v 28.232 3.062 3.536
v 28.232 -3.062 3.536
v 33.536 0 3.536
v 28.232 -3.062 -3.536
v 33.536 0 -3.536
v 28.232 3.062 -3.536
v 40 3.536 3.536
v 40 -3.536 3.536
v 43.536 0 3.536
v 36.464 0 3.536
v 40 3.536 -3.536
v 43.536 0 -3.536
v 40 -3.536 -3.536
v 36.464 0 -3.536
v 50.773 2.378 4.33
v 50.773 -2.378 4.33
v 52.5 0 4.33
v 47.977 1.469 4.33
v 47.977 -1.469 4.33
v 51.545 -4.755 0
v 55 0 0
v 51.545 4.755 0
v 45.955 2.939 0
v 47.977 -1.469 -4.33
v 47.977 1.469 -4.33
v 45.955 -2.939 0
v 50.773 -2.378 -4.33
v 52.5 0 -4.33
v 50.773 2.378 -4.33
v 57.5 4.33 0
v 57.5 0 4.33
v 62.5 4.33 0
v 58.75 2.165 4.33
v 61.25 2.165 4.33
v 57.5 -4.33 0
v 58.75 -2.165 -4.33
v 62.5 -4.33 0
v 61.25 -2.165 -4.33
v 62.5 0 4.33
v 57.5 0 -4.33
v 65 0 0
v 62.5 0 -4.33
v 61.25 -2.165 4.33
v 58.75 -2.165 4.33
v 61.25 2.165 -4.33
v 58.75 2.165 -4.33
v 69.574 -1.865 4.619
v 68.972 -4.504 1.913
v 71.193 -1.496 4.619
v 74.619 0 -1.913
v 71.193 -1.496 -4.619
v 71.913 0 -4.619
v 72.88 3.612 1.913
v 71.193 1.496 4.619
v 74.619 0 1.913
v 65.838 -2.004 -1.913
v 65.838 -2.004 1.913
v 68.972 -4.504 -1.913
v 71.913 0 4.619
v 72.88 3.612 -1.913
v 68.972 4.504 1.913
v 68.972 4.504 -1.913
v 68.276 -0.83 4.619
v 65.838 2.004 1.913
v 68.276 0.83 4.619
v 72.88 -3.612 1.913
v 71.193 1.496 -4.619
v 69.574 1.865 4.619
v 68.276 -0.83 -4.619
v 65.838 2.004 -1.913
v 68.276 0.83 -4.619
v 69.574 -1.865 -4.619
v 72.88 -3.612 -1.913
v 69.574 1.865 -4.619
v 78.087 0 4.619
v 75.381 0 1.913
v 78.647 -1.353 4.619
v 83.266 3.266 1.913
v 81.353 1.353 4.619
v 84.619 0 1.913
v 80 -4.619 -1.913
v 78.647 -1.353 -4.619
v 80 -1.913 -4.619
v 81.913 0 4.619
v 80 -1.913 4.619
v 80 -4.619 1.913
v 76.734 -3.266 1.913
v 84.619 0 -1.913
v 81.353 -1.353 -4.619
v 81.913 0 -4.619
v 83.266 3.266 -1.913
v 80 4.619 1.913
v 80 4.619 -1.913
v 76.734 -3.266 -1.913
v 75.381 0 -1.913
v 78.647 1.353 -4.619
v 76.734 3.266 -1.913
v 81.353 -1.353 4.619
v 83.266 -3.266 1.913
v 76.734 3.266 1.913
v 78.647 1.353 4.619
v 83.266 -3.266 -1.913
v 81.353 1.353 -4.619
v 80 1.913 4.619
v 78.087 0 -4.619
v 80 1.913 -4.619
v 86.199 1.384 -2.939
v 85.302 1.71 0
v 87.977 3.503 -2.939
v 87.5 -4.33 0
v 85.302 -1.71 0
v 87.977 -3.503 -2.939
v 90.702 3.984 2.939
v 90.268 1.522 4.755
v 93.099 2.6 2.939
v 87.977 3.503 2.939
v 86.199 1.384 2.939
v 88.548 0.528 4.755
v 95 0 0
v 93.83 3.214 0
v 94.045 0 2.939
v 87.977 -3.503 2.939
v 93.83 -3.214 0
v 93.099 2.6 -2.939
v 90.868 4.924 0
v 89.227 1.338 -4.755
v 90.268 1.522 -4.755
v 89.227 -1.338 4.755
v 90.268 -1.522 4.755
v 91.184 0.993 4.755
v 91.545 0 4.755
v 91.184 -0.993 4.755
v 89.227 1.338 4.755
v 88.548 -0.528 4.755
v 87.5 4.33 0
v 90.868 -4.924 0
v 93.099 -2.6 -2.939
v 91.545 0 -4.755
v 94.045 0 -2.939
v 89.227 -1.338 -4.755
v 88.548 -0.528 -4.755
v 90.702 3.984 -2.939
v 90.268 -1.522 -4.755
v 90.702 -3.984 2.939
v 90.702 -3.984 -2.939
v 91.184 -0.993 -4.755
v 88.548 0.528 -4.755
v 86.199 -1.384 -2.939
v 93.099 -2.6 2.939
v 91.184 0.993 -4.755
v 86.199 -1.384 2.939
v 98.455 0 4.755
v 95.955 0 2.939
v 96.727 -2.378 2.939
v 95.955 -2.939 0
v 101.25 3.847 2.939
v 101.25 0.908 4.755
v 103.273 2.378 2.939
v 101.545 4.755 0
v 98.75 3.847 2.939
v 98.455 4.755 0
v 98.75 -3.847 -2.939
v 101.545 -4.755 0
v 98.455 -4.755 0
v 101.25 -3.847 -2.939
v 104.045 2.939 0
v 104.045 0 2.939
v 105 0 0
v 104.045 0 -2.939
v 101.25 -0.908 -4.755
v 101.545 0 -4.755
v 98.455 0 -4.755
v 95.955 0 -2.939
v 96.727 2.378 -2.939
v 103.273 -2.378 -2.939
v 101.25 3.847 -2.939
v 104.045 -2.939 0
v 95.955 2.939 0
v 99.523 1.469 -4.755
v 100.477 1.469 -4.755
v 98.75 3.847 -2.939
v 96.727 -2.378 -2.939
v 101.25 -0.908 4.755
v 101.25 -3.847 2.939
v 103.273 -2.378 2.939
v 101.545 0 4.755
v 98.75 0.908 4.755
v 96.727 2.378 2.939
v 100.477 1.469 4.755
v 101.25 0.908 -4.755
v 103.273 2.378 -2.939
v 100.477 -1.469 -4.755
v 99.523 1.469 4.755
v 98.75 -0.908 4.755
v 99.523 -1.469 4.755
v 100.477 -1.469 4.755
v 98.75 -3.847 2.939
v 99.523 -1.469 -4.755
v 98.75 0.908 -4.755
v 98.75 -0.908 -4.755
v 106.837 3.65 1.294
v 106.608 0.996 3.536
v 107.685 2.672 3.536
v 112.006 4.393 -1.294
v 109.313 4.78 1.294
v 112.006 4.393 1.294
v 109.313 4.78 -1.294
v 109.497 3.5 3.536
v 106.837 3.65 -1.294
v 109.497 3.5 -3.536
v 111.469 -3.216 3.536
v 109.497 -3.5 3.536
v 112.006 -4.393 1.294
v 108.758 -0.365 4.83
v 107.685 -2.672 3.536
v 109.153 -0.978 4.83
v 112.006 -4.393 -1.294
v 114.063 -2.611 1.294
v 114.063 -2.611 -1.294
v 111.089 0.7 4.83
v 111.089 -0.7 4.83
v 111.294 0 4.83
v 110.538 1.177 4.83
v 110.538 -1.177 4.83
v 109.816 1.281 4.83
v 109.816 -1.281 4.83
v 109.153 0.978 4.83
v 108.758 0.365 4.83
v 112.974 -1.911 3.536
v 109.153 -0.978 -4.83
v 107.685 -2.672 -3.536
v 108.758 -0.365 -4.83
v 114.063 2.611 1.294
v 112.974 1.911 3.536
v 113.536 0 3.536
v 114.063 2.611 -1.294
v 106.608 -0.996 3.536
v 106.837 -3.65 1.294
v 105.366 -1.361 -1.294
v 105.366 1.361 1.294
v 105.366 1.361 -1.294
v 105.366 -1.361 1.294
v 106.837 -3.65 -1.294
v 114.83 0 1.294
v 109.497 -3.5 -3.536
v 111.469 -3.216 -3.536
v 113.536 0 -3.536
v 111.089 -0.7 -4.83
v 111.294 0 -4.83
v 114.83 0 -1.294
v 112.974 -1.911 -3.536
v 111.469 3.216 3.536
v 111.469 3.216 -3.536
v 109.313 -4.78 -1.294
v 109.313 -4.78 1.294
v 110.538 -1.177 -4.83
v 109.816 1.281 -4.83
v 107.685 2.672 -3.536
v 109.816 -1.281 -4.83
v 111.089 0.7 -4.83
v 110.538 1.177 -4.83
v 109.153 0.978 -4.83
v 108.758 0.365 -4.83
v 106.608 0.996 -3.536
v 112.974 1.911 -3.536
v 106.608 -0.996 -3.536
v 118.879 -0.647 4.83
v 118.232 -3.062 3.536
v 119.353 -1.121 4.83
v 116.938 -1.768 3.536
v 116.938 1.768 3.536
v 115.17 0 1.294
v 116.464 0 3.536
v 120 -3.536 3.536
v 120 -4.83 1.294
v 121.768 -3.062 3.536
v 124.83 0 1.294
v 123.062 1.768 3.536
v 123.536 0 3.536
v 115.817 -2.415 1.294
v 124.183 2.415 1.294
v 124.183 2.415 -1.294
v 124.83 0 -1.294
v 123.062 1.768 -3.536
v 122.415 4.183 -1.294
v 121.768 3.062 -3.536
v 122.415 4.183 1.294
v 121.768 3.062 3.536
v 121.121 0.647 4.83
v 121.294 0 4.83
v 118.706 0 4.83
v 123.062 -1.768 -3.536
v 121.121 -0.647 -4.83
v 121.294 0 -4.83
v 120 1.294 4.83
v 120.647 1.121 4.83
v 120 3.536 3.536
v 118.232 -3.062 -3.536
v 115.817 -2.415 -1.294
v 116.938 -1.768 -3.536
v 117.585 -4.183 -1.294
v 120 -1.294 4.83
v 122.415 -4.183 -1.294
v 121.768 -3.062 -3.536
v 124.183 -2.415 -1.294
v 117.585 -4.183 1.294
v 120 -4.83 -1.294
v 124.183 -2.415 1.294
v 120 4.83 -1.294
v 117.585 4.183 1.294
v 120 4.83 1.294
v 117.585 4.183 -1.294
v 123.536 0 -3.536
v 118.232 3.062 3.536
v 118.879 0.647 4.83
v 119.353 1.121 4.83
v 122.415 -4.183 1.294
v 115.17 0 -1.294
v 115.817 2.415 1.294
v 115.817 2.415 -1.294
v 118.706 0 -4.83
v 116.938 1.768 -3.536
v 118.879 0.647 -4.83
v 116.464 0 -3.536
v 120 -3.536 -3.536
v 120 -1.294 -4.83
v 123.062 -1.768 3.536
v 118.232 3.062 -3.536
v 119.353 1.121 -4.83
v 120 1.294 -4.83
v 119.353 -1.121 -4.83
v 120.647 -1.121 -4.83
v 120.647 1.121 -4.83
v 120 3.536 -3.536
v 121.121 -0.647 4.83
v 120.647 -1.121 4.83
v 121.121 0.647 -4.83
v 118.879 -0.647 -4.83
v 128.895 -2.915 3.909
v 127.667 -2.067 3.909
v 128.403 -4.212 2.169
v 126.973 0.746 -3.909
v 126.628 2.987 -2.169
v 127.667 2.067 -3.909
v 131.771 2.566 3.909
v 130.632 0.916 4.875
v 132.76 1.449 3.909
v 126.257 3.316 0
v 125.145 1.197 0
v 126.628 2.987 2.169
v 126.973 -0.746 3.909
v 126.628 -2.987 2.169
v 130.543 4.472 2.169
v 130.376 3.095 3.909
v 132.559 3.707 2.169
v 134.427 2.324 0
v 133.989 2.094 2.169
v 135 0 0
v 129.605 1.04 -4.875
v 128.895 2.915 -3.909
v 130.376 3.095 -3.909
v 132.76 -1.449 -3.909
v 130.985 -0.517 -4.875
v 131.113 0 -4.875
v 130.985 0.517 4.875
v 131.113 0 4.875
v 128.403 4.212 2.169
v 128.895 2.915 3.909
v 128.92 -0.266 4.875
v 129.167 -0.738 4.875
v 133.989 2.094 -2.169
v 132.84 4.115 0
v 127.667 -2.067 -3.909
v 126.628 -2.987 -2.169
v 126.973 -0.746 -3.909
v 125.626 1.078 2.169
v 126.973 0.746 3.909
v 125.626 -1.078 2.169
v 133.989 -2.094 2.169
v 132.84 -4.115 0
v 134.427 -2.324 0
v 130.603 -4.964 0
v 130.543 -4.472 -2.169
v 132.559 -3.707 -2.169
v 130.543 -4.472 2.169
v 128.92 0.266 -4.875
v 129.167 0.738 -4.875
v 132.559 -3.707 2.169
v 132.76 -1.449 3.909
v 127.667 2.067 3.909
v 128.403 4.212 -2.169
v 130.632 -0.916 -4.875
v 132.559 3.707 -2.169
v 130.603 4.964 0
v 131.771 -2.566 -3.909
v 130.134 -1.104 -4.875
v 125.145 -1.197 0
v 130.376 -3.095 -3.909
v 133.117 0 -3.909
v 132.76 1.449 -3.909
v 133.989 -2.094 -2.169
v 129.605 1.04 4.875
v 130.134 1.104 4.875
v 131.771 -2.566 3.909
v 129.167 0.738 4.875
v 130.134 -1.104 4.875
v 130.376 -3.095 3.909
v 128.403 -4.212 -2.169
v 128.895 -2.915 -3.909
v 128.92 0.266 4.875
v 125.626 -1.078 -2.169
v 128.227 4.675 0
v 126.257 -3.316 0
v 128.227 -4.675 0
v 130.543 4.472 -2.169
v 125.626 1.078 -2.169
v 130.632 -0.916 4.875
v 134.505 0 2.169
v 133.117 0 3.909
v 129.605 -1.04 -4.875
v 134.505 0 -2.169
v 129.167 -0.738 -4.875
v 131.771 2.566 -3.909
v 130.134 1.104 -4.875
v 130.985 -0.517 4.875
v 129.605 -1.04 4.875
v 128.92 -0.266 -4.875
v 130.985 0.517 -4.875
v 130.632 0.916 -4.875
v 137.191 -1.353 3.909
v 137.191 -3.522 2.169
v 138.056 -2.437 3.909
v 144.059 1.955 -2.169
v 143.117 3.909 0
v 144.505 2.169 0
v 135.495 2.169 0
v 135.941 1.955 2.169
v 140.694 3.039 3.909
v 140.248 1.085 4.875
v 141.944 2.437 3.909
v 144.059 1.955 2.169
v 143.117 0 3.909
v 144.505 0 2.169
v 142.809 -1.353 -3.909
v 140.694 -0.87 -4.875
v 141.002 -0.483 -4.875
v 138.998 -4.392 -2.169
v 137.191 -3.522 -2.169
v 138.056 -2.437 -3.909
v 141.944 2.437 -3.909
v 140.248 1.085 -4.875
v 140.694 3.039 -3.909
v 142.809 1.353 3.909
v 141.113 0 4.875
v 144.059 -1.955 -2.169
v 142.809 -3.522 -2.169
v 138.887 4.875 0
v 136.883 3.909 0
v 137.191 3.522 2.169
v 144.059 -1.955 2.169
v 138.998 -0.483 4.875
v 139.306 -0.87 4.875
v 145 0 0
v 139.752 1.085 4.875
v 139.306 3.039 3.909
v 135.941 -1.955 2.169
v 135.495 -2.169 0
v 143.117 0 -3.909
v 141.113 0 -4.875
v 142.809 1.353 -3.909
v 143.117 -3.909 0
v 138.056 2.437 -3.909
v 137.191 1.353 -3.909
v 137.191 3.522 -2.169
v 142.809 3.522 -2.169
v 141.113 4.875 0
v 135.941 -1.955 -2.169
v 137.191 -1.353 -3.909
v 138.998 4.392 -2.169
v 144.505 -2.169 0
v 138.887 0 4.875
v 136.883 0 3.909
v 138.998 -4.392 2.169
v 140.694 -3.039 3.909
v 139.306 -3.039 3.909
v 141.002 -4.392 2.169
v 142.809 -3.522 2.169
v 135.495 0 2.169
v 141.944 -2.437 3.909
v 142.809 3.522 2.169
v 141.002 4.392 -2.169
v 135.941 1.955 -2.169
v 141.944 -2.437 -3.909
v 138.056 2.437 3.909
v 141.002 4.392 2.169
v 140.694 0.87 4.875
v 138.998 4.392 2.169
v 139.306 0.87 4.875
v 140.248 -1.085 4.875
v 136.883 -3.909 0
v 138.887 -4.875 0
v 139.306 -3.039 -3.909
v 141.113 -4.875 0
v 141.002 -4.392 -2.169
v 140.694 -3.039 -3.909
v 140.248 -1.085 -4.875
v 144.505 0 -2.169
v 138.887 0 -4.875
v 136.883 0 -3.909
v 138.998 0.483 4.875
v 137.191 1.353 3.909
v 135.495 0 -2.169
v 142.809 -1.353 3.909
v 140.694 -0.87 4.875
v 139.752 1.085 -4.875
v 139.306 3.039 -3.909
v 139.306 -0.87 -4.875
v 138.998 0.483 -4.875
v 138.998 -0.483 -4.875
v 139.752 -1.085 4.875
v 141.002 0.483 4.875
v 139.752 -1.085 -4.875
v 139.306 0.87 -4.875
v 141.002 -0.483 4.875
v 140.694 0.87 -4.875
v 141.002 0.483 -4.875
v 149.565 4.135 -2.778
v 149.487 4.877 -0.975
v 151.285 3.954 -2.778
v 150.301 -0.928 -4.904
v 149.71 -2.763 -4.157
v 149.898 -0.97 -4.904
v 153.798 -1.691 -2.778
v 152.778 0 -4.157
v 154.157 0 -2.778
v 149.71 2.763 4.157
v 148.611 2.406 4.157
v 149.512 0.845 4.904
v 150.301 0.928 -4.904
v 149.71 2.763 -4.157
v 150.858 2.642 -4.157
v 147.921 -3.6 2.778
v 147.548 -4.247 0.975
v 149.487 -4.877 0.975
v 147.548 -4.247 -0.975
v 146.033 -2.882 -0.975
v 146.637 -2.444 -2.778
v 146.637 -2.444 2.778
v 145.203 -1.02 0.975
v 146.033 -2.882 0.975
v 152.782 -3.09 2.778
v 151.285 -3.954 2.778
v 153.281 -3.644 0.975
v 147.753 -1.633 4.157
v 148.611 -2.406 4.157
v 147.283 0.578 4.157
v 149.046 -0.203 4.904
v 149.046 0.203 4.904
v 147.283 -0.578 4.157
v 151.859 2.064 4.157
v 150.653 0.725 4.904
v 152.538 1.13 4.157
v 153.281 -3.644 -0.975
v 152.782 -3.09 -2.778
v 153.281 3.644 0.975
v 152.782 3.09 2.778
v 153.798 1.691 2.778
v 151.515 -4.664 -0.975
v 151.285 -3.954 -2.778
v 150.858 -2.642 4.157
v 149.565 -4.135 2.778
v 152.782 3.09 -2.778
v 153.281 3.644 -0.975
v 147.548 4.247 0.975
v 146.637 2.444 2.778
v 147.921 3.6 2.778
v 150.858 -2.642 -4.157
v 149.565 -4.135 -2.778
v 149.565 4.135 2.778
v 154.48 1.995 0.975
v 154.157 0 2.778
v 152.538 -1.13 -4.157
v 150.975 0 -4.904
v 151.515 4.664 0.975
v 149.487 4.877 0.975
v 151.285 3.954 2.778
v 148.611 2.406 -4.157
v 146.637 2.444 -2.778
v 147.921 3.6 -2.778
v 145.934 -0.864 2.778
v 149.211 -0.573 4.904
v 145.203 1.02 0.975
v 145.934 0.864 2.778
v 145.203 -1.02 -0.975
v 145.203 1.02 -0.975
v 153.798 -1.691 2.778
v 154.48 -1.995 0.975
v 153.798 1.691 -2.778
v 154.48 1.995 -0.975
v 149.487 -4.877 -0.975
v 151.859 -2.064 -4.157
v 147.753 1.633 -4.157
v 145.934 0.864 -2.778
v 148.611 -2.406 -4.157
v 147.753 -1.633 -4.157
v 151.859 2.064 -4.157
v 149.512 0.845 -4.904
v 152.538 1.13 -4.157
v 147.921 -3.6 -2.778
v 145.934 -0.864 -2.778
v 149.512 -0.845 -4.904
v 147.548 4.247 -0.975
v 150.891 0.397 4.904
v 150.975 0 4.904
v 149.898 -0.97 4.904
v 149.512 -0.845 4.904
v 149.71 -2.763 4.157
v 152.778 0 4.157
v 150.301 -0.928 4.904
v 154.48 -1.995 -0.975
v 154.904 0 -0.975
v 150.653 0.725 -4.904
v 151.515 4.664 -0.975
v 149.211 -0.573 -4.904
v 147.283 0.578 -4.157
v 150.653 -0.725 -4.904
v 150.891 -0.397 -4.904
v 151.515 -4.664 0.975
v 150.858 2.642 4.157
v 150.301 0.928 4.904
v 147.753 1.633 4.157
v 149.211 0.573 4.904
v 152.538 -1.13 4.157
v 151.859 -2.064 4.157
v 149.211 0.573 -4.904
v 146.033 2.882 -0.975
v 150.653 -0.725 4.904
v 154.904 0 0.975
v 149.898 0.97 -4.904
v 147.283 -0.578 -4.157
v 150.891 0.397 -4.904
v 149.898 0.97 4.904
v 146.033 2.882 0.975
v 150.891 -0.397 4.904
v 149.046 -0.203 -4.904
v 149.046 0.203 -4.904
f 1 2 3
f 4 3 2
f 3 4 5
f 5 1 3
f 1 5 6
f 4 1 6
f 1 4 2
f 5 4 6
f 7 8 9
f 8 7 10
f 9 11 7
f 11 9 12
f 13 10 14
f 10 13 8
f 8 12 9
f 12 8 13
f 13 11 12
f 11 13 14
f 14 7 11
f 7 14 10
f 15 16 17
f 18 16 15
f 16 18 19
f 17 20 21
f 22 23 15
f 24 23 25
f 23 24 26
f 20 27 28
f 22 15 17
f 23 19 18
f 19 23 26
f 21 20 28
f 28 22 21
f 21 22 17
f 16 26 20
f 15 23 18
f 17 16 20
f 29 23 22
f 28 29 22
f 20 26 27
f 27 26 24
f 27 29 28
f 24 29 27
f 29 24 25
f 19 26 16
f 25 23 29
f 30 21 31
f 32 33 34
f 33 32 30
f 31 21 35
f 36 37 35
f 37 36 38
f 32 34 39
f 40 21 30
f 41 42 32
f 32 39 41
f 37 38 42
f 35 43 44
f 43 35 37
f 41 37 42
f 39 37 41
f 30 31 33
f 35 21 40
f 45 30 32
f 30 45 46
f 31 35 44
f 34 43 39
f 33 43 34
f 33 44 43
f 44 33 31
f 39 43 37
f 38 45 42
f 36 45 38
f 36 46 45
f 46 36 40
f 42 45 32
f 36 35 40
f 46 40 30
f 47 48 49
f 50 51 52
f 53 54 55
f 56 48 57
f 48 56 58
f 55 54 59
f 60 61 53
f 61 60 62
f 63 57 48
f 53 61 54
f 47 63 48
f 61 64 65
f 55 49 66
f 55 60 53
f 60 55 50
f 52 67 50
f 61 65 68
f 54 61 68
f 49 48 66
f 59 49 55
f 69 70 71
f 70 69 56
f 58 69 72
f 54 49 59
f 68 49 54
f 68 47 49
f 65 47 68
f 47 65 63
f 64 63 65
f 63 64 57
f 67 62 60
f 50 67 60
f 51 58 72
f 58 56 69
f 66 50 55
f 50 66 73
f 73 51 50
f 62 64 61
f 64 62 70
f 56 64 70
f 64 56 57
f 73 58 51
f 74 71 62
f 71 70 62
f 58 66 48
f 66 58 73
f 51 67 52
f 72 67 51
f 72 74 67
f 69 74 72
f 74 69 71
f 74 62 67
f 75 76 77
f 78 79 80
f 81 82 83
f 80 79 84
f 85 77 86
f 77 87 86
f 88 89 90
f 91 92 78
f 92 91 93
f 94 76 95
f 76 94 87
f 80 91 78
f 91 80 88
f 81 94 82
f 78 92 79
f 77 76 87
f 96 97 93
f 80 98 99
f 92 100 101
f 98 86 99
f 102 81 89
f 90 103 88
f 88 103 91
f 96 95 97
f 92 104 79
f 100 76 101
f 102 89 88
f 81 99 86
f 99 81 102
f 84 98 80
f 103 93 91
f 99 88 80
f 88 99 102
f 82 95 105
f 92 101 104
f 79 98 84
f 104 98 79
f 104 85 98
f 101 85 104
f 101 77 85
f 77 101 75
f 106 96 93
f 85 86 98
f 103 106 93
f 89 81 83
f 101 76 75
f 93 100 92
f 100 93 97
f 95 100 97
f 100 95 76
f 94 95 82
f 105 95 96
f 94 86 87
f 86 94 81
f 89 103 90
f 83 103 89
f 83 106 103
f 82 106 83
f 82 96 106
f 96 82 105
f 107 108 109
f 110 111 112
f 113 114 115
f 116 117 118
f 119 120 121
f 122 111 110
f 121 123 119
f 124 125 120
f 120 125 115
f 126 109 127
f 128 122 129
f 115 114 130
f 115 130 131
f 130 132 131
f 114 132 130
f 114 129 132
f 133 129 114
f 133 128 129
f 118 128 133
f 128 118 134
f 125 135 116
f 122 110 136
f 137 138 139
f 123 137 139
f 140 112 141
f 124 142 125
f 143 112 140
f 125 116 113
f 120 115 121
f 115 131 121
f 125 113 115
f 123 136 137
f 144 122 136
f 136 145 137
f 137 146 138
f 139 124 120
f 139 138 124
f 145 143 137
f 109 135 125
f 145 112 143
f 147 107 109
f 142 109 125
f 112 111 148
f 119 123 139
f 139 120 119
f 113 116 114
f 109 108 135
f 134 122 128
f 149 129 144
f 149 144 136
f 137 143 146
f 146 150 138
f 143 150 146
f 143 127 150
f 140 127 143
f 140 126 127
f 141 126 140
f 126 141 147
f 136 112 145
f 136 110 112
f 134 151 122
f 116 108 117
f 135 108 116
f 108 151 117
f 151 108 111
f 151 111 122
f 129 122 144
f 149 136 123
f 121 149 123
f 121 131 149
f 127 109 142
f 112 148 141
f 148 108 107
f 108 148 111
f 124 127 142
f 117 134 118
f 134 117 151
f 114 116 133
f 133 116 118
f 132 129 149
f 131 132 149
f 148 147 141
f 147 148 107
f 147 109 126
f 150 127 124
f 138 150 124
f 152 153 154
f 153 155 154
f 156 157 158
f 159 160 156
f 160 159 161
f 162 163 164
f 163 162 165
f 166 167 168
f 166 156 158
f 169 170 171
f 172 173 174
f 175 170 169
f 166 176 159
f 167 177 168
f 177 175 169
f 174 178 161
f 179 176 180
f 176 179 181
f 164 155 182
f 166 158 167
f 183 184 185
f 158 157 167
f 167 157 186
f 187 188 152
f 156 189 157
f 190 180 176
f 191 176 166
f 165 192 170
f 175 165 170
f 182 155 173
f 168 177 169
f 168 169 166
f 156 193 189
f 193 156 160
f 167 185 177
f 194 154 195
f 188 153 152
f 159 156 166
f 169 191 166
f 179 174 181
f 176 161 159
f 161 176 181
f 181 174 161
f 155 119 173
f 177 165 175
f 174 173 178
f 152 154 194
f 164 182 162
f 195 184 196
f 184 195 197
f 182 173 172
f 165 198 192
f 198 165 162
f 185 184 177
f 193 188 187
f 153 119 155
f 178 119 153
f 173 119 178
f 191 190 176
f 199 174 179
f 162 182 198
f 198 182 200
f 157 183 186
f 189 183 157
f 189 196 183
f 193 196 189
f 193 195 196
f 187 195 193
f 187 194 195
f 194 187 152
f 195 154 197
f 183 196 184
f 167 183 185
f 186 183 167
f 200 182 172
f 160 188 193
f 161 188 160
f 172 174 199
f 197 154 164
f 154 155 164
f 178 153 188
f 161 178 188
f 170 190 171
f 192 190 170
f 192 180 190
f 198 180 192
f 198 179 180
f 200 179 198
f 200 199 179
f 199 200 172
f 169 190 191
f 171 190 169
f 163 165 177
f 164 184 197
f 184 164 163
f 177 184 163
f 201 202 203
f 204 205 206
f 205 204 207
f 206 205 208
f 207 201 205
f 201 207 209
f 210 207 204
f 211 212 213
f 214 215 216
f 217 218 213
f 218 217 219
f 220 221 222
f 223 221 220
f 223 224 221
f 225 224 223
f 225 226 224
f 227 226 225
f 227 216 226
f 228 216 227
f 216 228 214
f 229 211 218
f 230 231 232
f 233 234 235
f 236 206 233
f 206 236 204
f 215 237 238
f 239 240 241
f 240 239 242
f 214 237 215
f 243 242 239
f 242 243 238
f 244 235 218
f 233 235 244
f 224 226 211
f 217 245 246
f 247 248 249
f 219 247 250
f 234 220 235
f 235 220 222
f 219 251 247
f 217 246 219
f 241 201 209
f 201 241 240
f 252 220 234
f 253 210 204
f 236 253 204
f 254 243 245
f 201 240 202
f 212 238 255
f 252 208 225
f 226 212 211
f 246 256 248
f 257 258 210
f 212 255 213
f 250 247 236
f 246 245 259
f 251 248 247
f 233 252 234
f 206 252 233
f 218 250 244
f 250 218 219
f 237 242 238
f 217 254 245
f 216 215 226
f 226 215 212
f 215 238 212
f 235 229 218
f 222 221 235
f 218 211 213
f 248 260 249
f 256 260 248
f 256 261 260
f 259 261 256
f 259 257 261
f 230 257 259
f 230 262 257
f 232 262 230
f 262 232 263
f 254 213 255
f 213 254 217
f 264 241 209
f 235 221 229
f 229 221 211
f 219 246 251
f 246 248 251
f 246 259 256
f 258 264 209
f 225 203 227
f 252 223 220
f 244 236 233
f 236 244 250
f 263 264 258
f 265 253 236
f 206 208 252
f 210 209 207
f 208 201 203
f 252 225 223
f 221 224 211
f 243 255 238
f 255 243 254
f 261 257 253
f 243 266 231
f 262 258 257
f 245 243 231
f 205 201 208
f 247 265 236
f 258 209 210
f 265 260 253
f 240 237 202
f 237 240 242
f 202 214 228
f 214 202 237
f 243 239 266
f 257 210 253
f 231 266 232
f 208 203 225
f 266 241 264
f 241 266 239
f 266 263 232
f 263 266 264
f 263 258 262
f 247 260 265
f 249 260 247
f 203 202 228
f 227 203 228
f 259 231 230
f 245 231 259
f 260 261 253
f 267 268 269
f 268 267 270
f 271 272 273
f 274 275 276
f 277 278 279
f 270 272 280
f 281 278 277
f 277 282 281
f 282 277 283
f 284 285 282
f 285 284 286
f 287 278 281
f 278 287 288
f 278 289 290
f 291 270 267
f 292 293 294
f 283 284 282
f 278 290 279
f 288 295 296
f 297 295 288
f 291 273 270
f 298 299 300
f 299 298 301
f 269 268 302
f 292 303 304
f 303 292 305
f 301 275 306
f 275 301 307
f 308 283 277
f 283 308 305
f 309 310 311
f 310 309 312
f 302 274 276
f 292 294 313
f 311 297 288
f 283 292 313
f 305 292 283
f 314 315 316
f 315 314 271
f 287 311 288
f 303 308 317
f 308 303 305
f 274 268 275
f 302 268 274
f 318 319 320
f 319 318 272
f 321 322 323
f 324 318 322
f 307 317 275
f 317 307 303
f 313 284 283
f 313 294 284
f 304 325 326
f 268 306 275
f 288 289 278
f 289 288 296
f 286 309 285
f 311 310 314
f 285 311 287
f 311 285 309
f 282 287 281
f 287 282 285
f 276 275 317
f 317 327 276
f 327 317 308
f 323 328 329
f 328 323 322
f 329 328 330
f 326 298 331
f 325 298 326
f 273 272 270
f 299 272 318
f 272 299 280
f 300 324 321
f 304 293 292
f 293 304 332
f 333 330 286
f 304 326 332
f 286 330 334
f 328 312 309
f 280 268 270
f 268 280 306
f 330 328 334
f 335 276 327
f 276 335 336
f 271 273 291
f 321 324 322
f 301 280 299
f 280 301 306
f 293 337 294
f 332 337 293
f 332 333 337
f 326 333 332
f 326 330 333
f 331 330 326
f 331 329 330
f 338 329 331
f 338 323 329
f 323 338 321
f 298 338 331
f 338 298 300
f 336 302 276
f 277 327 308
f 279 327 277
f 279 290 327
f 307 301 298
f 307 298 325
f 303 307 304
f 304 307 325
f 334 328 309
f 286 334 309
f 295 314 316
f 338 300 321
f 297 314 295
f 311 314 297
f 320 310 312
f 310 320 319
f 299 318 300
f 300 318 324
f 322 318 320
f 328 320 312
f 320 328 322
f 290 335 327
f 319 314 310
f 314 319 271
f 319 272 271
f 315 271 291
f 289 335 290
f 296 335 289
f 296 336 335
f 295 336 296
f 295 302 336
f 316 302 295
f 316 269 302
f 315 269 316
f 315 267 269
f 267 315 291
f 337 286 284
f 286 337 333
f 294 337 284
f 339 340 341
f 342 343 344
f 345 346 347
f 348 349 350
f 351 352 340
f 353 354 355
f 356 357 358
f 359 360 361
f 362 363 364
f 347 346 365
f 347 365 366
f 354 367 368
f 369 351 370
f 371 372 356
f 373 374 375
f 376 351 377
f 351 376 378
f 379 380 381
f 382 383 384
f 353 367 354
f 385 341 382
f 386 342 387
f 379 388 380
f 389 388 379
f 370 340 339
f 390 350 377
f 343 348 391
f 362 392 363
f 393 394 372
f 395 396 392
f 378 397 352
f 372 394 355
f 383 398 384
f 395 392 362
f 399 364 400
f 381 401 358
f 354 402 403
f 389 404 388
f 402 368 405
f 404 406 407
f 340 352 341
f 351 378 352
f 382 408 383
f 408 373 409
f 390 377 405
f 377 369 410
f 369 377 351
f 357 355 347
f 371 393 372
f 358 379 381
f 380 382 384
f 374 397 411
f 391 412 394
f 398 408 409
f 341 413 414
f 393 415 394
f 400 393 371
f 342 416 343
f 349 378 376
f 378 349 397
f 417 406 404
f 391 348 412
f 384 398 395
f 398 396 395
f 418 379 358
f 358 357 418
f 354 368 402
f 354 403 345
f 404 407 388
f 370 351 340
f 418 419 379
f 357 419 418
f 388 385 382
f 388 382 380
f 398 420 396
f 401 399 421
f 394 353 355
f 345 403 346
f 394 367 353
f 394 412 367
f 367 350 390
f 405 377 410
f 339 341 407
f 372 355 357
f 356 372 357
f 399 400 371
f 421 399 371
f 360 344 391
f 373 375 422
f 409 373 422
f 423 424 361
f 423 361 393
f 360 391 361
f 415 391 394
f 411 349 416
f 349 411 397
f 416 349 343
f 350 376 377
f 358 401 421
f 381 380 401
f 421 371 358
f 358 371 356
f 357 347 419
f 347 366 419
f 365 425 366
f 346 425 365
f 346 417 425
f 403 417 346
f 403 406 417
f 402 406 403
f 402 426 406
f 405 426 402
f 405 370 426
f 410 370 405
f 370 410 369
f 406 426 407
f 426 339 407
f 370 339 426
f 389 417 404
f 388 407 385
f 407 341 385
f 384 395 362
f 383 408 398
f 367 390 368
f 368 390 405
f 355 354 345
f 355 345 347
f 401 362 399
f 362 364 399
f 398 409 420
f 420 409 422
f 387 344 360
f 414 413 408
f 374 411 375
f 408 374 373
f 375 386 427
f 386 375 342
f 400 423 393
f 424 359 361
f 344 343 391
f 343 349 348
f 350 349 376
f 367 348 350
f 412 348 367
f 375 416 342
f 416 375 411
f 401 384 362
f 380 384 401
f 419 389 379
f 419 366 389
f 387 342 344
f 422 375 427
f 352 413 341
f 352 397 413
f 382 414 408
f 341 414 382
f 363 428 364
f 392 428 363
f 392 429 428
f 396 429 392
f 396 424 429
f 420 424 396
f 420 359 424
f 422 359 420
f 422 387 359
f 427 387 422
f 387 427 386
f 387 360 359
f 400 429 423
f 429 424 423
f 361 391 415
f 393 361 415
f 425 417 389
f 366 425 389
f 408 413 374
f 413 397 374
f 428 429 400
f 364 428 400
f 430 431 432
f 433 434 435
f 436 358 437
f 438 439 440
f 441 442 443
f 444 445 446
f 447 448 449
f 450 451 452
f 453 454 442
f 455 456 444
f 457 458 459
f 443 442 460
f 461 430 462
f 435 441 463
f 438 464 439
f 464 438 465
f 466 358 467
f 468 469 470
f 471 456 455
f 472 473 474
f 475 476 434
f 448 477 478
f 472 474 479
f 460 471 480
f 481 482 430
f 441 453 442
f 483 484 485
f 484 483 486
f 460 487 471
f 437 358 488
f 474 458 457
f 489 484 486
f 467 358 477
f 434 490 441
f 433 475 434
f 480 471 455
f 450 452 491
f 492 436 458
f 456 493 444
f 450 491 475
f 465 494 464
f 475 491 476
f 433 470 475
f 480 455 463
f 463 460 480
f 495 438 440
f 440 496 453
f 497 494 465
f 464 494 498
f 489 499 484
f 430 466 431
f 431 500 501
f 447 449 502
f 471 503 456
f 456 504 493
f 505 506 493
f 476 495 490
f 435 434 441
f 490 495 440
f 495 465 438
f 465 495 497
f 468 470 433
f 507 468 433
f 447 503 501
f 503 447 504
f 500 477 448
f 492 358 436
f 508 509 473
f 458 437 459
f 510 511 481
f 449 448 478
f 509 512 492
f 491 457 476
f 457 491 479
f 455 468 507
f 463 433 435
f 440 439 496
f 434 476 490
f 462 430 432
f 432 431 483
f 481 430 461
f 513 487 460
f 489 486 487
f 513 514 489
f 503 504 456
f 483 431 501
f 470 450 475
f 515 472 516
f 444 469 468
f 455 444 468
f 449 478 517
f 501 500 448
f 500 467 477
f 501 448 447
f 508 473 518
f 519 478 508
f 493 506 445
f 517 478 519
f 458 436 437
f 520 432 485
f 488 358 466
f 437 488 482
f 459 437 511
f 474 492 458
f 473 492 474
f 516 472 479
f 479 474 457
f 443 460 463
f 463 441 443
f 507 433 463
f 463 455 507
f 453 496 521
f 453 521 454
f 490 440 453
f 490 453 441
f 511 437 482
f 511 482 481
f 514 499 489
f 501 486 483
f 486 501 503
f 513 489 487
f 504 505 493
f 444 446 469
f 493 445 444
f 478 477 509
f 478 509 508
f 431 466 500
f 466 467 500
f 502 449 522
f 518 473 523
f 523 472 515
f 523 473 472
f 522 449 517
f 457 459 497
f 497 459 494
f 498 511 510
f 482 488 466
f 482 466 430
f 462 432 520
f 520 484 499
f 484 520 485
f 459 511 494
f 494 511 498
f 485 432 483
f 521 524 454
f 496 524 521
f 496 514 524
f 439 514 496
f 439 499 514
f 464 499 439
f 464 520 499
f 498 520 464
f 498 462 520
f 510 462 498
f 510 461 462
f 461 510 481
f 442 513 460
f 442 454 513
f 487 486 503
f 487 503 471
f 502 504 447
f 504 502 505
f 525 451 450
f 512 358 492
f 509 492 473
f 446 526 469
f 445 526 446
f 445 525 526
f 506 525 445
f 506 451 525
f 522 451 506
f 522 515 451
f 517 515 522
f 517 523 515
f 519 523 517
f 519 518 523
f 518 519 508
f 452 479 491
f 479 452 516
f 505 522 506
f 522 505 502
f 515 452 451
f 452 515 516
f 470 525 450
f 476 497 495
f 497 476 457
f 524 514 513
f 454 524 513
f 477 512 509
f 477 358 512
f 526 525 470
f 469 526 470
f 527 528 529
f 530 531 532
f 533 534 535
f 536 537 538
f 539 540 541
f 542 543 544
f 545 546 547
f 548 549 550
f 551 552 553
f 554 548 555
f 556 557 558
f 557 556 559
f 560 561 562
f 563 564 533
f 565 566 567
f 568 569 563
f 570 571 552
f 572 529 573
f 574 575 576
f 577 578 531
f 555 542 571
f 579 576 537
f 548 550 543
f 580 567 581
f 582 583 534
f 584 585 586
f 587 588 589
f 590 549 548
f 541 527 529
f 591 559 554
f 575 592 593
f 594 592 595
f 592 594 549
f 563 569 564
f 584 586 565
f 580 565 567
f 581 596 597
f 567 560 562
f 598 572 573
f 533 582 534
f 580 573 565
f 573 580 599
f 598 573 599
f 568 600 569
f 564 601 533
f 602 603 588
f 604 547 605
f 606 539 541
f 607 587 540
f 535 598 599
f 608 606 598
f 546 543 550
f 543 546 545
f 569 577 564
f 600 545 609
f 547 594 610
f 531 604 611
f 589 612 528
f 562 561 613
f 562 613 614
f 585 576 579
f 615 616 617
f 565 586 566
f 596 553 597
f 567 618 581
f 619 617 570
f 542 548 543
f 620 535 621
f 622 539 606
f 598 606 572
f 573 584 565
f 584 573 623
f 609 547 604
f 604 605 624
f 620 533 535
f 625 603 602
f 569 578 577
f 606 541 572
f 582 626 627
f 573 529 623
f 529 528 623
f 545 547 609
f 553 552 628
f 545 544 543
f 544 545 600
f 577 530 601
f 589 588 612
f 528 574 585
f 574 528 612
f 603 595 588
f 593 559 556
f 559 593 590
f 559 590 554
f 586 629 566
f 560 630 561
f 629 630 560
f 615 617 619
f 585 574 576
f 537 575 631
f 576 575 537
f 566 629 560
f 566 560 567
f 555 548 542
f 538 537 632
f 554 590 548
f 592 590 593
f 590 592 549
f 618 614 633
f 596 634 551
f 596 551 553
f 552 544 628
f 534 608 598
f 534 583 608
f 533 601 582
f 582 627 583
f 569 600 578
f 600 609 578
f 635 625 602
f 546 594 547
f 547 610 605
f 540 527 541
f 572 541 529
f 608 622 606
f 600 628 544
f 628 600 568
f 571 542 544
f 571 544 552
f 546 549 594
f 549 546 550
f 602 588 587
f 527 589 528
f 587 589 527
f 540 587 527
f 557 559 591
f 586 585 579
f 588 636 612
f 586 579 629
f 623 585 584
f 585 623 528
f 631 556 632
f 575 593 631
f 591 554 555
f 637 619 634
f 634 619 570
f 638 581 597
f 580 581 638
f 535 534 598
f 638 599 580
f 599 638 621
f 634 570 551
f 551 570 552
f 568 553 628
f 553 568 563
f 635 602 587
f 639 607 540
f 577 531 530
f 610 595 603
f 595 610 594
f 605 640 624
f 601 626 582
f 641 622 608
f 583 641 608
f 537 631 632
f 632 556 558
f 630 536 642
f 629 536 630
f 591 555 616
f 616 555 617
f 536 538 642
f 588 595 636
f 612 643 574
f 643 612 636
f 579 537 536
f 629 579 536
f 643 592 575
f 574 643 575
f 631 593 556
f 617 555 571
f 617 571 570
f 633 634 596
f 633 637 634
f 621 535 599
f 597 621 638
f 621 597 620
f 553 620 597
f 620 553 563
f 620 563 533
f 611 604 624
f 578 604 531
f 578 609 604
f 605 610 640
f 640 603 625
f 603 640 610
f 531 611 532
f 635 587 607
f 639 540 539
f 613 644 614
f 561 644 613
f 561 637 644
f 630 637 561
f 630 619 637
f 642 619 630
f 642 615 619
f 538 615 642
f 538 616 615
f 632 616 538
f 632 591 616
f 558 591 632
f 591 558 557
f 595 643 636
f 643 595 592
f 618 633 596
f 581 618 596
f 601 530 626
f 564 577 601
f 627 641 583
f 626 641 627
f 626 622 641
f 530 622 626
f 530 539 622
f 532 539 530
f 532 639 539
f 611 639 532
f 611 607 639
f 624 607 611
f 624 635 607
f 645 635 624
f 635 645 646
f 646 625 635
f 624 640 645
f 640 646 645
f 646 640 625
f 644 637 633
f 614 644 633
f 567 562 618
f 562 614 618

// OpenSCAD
for (faces=[3:1:15]) {
    $fn = faces;
    x_position = faces*10;
    translate([x_position, 0, 0]) sphere(r=5);
    echo("faces:", faces, "x-position:", x_position);
}
